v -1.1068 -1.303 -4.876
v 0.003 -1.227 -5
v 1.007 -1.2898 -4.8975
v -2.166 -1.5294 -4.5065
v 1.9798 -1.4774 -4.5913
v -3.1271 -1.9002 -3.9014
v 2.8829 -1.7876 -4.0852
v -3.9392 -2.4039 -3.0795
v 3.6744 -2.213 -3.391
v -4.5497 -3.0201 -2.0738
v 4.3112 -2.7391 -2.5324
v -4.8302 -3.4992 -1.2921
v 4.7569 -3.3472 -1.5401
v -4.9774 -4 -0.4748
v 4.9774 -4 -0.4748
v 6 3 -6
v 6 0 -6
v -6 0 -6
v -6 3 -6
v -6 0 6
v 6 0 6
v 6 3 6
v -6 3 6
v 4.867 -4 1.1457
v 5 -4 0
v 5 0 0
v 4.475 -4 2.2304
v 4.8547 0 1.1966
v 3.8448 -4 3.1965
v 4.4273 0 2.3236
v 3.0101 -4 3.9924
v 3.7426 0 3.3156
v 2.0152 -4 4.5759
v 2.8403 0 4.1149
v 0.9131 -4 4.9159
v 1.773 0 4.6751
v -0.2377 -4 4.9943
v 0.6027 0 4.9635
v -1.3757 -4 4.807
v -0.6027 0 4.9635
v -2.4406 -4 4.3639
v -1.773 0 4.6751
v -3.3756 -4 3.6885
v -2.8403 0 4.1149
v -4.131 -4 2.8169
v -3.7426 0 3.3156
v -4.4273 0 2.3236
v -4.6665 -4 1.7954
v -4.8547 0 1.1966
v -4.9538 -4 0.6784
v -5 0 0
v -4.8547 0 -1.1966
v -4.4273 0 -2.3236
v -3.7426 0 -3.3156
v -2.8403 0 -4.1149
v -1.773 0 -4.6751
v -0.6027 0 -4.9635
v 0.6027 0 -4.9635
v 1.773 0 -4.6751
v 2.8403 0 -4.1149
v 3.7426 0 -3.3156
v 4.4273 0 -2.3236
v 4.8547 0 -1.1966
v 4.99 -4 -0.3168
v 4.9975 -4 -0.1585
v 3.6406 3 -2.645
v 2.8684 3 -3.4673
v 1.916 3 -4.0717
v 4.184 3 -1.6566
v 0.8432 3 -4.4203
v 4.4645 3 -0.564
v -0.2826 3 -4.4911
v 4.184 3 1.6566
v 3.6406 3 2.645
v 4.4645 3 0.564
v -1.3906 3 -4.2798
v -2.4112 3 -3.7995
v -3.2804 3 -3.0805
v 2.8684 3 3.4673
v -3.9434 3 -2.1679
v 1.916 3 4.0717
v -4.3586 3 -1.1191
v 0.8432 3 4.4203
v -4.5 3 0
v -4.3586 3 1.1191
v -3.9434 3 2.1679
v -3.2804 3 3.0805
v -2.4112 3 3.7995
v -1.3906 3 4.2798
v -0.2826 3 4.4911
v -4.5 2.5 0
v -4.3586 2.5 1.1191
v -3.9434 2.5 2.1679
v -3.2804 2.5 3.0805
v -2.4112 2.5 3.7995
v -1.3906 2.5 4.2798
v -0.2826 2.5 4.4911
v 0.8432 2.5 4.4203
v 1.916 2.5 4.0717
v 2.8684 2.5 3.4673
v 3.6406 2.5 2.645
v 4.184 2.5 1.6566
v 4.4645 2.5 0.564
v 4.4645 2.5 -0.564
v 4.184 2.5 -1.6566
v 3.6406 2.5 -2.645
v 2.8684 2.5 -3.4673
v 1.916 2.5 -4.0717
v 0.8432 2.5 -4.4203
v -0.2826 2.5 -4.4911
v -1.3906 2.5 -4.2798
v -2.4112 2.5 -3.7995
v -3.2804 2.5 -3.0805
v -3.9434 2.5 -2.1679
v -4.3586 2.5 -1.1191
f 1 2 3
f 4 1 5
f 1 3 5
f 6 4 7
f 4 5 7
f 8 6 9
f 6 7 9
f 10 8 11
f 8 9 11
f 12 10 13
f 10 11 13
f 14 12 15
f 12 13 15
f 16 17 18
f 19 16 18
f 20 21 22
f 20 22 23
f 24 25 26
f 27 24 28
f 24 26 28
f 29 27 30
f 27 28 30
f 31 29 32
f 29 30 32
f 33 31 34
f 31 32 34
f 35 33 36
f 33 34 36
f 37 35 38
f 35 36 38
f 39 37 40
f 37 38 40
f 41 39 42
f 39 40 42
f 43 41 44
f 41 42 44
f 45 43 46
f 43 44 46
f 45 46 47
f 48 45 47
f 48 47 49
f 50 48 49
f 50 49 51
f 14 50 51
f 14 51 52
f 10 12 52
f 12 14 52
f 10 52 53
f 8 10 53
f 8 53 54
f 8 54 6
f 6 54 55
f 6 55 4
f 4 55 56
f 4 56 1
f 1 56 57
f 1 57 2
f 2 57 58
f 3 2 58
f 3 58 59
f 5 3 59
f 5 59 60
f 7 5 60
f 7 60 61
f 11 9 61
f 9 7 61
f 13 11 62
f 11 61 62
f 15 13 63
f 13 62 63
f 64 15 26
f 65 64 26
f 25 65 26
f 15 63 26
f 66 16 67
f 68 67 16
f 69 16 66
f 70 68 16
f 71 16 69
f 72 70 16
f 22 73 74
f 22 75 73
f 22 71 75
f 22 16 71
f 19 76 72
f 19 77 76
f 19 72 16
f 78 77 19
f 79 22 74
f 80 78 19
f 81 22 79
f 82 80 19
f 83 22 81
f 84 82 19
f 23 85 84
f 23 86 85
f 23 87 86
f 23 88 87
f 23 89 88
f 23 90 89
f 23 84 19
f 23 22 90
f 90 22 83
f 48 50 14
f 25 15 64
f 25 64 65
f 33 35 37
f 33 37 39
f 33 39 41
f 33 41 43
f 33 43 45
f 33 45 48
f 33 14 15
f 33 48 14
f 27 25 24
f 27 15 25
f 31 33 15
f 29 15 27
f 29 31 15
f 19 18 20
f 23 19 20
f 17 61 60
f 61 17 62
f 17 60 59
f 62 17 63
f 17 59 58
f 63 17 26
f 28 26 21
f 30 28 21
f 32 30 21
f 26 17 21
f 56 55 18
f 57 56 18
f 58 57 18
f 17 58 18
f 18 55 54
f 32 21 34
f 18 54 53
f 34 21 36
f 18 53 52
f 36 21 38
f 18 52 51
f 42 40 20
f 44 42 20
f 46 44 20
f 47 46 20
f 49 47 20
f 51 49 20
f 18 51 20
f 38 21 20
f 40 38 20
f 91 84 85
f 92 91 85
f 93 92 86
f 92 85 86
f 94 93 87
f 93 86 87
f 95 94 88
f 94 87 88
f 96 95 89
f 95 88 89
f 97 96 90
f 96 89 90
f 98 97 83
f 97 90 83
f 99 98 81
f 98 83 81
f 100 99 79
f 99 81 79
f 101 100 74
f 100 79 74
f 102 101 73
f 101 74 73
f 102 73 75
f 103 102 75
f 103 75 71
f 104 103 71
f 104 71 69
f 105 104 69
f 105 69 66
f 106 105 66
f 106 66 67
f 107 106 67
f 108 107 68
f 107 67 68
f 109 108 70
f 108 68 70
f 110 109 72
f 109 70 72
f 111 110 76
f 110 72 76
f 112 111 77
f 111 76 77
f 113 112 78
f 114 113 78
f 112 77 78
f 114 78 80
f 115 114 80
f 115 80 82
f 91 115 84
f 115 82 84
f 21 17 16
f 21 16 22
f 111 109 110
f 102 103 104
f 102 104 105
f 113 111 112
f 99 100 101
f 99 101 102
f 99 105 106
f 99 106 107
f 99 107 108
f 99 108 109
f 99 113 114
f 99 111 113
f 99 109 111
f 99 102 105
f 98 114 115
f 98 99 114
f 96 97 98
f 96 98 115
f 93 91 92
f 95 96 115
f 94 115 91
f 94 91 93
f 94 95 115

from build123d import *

# Parameters (mm, degrees)
F0_R     = 5
F1_DEPTH = 4
F3_DEPTH = 12.5
F4_W     = 12
F4_H     = 12
F5_DEPTH = 3
F6_R     = 4.5
F7_DEPTH = 0.5


with BuildPart() as f1:
    # F0 (on Front) → F1 (new body)
    with BuildSketch(Plane.XZ):
        Circle(F0_R)
    extrude(amount=F1_DEPTH)

    # F2 (on Right) → F3 (cut, symmetric)
    with BuildSketch(Plane.YZ):
        Polygon((-5.130814, -6.028544), (-0.71682, -5.832574), (-4.290942, 0), align=None)
    extrude(amount=F3_DEPTH, both=True, mode=Mode.SUBTRACT)

    # F4 (on face) → F5 (join)
    with BuildSketch(Plane(origin=(0, 0, 0), x_dir=(-1, 0, 0), z_dir=(0, 1, 0))):
        Rectangle(F4_W, F4_H)
    extrude(amount=F5_DEPTH)

    # F6 (on face) → F7 (cut)
    with BuildSketch(Plane(origin=(0, 3, 0), x_dir=(-1, 0, 0), z_dir=(0, 1, 0))):
        Circle(F6_R)
    extrude(amount=-F7_DEPTH, mode=Mode.SUBTRACT)


solid = f1.part
